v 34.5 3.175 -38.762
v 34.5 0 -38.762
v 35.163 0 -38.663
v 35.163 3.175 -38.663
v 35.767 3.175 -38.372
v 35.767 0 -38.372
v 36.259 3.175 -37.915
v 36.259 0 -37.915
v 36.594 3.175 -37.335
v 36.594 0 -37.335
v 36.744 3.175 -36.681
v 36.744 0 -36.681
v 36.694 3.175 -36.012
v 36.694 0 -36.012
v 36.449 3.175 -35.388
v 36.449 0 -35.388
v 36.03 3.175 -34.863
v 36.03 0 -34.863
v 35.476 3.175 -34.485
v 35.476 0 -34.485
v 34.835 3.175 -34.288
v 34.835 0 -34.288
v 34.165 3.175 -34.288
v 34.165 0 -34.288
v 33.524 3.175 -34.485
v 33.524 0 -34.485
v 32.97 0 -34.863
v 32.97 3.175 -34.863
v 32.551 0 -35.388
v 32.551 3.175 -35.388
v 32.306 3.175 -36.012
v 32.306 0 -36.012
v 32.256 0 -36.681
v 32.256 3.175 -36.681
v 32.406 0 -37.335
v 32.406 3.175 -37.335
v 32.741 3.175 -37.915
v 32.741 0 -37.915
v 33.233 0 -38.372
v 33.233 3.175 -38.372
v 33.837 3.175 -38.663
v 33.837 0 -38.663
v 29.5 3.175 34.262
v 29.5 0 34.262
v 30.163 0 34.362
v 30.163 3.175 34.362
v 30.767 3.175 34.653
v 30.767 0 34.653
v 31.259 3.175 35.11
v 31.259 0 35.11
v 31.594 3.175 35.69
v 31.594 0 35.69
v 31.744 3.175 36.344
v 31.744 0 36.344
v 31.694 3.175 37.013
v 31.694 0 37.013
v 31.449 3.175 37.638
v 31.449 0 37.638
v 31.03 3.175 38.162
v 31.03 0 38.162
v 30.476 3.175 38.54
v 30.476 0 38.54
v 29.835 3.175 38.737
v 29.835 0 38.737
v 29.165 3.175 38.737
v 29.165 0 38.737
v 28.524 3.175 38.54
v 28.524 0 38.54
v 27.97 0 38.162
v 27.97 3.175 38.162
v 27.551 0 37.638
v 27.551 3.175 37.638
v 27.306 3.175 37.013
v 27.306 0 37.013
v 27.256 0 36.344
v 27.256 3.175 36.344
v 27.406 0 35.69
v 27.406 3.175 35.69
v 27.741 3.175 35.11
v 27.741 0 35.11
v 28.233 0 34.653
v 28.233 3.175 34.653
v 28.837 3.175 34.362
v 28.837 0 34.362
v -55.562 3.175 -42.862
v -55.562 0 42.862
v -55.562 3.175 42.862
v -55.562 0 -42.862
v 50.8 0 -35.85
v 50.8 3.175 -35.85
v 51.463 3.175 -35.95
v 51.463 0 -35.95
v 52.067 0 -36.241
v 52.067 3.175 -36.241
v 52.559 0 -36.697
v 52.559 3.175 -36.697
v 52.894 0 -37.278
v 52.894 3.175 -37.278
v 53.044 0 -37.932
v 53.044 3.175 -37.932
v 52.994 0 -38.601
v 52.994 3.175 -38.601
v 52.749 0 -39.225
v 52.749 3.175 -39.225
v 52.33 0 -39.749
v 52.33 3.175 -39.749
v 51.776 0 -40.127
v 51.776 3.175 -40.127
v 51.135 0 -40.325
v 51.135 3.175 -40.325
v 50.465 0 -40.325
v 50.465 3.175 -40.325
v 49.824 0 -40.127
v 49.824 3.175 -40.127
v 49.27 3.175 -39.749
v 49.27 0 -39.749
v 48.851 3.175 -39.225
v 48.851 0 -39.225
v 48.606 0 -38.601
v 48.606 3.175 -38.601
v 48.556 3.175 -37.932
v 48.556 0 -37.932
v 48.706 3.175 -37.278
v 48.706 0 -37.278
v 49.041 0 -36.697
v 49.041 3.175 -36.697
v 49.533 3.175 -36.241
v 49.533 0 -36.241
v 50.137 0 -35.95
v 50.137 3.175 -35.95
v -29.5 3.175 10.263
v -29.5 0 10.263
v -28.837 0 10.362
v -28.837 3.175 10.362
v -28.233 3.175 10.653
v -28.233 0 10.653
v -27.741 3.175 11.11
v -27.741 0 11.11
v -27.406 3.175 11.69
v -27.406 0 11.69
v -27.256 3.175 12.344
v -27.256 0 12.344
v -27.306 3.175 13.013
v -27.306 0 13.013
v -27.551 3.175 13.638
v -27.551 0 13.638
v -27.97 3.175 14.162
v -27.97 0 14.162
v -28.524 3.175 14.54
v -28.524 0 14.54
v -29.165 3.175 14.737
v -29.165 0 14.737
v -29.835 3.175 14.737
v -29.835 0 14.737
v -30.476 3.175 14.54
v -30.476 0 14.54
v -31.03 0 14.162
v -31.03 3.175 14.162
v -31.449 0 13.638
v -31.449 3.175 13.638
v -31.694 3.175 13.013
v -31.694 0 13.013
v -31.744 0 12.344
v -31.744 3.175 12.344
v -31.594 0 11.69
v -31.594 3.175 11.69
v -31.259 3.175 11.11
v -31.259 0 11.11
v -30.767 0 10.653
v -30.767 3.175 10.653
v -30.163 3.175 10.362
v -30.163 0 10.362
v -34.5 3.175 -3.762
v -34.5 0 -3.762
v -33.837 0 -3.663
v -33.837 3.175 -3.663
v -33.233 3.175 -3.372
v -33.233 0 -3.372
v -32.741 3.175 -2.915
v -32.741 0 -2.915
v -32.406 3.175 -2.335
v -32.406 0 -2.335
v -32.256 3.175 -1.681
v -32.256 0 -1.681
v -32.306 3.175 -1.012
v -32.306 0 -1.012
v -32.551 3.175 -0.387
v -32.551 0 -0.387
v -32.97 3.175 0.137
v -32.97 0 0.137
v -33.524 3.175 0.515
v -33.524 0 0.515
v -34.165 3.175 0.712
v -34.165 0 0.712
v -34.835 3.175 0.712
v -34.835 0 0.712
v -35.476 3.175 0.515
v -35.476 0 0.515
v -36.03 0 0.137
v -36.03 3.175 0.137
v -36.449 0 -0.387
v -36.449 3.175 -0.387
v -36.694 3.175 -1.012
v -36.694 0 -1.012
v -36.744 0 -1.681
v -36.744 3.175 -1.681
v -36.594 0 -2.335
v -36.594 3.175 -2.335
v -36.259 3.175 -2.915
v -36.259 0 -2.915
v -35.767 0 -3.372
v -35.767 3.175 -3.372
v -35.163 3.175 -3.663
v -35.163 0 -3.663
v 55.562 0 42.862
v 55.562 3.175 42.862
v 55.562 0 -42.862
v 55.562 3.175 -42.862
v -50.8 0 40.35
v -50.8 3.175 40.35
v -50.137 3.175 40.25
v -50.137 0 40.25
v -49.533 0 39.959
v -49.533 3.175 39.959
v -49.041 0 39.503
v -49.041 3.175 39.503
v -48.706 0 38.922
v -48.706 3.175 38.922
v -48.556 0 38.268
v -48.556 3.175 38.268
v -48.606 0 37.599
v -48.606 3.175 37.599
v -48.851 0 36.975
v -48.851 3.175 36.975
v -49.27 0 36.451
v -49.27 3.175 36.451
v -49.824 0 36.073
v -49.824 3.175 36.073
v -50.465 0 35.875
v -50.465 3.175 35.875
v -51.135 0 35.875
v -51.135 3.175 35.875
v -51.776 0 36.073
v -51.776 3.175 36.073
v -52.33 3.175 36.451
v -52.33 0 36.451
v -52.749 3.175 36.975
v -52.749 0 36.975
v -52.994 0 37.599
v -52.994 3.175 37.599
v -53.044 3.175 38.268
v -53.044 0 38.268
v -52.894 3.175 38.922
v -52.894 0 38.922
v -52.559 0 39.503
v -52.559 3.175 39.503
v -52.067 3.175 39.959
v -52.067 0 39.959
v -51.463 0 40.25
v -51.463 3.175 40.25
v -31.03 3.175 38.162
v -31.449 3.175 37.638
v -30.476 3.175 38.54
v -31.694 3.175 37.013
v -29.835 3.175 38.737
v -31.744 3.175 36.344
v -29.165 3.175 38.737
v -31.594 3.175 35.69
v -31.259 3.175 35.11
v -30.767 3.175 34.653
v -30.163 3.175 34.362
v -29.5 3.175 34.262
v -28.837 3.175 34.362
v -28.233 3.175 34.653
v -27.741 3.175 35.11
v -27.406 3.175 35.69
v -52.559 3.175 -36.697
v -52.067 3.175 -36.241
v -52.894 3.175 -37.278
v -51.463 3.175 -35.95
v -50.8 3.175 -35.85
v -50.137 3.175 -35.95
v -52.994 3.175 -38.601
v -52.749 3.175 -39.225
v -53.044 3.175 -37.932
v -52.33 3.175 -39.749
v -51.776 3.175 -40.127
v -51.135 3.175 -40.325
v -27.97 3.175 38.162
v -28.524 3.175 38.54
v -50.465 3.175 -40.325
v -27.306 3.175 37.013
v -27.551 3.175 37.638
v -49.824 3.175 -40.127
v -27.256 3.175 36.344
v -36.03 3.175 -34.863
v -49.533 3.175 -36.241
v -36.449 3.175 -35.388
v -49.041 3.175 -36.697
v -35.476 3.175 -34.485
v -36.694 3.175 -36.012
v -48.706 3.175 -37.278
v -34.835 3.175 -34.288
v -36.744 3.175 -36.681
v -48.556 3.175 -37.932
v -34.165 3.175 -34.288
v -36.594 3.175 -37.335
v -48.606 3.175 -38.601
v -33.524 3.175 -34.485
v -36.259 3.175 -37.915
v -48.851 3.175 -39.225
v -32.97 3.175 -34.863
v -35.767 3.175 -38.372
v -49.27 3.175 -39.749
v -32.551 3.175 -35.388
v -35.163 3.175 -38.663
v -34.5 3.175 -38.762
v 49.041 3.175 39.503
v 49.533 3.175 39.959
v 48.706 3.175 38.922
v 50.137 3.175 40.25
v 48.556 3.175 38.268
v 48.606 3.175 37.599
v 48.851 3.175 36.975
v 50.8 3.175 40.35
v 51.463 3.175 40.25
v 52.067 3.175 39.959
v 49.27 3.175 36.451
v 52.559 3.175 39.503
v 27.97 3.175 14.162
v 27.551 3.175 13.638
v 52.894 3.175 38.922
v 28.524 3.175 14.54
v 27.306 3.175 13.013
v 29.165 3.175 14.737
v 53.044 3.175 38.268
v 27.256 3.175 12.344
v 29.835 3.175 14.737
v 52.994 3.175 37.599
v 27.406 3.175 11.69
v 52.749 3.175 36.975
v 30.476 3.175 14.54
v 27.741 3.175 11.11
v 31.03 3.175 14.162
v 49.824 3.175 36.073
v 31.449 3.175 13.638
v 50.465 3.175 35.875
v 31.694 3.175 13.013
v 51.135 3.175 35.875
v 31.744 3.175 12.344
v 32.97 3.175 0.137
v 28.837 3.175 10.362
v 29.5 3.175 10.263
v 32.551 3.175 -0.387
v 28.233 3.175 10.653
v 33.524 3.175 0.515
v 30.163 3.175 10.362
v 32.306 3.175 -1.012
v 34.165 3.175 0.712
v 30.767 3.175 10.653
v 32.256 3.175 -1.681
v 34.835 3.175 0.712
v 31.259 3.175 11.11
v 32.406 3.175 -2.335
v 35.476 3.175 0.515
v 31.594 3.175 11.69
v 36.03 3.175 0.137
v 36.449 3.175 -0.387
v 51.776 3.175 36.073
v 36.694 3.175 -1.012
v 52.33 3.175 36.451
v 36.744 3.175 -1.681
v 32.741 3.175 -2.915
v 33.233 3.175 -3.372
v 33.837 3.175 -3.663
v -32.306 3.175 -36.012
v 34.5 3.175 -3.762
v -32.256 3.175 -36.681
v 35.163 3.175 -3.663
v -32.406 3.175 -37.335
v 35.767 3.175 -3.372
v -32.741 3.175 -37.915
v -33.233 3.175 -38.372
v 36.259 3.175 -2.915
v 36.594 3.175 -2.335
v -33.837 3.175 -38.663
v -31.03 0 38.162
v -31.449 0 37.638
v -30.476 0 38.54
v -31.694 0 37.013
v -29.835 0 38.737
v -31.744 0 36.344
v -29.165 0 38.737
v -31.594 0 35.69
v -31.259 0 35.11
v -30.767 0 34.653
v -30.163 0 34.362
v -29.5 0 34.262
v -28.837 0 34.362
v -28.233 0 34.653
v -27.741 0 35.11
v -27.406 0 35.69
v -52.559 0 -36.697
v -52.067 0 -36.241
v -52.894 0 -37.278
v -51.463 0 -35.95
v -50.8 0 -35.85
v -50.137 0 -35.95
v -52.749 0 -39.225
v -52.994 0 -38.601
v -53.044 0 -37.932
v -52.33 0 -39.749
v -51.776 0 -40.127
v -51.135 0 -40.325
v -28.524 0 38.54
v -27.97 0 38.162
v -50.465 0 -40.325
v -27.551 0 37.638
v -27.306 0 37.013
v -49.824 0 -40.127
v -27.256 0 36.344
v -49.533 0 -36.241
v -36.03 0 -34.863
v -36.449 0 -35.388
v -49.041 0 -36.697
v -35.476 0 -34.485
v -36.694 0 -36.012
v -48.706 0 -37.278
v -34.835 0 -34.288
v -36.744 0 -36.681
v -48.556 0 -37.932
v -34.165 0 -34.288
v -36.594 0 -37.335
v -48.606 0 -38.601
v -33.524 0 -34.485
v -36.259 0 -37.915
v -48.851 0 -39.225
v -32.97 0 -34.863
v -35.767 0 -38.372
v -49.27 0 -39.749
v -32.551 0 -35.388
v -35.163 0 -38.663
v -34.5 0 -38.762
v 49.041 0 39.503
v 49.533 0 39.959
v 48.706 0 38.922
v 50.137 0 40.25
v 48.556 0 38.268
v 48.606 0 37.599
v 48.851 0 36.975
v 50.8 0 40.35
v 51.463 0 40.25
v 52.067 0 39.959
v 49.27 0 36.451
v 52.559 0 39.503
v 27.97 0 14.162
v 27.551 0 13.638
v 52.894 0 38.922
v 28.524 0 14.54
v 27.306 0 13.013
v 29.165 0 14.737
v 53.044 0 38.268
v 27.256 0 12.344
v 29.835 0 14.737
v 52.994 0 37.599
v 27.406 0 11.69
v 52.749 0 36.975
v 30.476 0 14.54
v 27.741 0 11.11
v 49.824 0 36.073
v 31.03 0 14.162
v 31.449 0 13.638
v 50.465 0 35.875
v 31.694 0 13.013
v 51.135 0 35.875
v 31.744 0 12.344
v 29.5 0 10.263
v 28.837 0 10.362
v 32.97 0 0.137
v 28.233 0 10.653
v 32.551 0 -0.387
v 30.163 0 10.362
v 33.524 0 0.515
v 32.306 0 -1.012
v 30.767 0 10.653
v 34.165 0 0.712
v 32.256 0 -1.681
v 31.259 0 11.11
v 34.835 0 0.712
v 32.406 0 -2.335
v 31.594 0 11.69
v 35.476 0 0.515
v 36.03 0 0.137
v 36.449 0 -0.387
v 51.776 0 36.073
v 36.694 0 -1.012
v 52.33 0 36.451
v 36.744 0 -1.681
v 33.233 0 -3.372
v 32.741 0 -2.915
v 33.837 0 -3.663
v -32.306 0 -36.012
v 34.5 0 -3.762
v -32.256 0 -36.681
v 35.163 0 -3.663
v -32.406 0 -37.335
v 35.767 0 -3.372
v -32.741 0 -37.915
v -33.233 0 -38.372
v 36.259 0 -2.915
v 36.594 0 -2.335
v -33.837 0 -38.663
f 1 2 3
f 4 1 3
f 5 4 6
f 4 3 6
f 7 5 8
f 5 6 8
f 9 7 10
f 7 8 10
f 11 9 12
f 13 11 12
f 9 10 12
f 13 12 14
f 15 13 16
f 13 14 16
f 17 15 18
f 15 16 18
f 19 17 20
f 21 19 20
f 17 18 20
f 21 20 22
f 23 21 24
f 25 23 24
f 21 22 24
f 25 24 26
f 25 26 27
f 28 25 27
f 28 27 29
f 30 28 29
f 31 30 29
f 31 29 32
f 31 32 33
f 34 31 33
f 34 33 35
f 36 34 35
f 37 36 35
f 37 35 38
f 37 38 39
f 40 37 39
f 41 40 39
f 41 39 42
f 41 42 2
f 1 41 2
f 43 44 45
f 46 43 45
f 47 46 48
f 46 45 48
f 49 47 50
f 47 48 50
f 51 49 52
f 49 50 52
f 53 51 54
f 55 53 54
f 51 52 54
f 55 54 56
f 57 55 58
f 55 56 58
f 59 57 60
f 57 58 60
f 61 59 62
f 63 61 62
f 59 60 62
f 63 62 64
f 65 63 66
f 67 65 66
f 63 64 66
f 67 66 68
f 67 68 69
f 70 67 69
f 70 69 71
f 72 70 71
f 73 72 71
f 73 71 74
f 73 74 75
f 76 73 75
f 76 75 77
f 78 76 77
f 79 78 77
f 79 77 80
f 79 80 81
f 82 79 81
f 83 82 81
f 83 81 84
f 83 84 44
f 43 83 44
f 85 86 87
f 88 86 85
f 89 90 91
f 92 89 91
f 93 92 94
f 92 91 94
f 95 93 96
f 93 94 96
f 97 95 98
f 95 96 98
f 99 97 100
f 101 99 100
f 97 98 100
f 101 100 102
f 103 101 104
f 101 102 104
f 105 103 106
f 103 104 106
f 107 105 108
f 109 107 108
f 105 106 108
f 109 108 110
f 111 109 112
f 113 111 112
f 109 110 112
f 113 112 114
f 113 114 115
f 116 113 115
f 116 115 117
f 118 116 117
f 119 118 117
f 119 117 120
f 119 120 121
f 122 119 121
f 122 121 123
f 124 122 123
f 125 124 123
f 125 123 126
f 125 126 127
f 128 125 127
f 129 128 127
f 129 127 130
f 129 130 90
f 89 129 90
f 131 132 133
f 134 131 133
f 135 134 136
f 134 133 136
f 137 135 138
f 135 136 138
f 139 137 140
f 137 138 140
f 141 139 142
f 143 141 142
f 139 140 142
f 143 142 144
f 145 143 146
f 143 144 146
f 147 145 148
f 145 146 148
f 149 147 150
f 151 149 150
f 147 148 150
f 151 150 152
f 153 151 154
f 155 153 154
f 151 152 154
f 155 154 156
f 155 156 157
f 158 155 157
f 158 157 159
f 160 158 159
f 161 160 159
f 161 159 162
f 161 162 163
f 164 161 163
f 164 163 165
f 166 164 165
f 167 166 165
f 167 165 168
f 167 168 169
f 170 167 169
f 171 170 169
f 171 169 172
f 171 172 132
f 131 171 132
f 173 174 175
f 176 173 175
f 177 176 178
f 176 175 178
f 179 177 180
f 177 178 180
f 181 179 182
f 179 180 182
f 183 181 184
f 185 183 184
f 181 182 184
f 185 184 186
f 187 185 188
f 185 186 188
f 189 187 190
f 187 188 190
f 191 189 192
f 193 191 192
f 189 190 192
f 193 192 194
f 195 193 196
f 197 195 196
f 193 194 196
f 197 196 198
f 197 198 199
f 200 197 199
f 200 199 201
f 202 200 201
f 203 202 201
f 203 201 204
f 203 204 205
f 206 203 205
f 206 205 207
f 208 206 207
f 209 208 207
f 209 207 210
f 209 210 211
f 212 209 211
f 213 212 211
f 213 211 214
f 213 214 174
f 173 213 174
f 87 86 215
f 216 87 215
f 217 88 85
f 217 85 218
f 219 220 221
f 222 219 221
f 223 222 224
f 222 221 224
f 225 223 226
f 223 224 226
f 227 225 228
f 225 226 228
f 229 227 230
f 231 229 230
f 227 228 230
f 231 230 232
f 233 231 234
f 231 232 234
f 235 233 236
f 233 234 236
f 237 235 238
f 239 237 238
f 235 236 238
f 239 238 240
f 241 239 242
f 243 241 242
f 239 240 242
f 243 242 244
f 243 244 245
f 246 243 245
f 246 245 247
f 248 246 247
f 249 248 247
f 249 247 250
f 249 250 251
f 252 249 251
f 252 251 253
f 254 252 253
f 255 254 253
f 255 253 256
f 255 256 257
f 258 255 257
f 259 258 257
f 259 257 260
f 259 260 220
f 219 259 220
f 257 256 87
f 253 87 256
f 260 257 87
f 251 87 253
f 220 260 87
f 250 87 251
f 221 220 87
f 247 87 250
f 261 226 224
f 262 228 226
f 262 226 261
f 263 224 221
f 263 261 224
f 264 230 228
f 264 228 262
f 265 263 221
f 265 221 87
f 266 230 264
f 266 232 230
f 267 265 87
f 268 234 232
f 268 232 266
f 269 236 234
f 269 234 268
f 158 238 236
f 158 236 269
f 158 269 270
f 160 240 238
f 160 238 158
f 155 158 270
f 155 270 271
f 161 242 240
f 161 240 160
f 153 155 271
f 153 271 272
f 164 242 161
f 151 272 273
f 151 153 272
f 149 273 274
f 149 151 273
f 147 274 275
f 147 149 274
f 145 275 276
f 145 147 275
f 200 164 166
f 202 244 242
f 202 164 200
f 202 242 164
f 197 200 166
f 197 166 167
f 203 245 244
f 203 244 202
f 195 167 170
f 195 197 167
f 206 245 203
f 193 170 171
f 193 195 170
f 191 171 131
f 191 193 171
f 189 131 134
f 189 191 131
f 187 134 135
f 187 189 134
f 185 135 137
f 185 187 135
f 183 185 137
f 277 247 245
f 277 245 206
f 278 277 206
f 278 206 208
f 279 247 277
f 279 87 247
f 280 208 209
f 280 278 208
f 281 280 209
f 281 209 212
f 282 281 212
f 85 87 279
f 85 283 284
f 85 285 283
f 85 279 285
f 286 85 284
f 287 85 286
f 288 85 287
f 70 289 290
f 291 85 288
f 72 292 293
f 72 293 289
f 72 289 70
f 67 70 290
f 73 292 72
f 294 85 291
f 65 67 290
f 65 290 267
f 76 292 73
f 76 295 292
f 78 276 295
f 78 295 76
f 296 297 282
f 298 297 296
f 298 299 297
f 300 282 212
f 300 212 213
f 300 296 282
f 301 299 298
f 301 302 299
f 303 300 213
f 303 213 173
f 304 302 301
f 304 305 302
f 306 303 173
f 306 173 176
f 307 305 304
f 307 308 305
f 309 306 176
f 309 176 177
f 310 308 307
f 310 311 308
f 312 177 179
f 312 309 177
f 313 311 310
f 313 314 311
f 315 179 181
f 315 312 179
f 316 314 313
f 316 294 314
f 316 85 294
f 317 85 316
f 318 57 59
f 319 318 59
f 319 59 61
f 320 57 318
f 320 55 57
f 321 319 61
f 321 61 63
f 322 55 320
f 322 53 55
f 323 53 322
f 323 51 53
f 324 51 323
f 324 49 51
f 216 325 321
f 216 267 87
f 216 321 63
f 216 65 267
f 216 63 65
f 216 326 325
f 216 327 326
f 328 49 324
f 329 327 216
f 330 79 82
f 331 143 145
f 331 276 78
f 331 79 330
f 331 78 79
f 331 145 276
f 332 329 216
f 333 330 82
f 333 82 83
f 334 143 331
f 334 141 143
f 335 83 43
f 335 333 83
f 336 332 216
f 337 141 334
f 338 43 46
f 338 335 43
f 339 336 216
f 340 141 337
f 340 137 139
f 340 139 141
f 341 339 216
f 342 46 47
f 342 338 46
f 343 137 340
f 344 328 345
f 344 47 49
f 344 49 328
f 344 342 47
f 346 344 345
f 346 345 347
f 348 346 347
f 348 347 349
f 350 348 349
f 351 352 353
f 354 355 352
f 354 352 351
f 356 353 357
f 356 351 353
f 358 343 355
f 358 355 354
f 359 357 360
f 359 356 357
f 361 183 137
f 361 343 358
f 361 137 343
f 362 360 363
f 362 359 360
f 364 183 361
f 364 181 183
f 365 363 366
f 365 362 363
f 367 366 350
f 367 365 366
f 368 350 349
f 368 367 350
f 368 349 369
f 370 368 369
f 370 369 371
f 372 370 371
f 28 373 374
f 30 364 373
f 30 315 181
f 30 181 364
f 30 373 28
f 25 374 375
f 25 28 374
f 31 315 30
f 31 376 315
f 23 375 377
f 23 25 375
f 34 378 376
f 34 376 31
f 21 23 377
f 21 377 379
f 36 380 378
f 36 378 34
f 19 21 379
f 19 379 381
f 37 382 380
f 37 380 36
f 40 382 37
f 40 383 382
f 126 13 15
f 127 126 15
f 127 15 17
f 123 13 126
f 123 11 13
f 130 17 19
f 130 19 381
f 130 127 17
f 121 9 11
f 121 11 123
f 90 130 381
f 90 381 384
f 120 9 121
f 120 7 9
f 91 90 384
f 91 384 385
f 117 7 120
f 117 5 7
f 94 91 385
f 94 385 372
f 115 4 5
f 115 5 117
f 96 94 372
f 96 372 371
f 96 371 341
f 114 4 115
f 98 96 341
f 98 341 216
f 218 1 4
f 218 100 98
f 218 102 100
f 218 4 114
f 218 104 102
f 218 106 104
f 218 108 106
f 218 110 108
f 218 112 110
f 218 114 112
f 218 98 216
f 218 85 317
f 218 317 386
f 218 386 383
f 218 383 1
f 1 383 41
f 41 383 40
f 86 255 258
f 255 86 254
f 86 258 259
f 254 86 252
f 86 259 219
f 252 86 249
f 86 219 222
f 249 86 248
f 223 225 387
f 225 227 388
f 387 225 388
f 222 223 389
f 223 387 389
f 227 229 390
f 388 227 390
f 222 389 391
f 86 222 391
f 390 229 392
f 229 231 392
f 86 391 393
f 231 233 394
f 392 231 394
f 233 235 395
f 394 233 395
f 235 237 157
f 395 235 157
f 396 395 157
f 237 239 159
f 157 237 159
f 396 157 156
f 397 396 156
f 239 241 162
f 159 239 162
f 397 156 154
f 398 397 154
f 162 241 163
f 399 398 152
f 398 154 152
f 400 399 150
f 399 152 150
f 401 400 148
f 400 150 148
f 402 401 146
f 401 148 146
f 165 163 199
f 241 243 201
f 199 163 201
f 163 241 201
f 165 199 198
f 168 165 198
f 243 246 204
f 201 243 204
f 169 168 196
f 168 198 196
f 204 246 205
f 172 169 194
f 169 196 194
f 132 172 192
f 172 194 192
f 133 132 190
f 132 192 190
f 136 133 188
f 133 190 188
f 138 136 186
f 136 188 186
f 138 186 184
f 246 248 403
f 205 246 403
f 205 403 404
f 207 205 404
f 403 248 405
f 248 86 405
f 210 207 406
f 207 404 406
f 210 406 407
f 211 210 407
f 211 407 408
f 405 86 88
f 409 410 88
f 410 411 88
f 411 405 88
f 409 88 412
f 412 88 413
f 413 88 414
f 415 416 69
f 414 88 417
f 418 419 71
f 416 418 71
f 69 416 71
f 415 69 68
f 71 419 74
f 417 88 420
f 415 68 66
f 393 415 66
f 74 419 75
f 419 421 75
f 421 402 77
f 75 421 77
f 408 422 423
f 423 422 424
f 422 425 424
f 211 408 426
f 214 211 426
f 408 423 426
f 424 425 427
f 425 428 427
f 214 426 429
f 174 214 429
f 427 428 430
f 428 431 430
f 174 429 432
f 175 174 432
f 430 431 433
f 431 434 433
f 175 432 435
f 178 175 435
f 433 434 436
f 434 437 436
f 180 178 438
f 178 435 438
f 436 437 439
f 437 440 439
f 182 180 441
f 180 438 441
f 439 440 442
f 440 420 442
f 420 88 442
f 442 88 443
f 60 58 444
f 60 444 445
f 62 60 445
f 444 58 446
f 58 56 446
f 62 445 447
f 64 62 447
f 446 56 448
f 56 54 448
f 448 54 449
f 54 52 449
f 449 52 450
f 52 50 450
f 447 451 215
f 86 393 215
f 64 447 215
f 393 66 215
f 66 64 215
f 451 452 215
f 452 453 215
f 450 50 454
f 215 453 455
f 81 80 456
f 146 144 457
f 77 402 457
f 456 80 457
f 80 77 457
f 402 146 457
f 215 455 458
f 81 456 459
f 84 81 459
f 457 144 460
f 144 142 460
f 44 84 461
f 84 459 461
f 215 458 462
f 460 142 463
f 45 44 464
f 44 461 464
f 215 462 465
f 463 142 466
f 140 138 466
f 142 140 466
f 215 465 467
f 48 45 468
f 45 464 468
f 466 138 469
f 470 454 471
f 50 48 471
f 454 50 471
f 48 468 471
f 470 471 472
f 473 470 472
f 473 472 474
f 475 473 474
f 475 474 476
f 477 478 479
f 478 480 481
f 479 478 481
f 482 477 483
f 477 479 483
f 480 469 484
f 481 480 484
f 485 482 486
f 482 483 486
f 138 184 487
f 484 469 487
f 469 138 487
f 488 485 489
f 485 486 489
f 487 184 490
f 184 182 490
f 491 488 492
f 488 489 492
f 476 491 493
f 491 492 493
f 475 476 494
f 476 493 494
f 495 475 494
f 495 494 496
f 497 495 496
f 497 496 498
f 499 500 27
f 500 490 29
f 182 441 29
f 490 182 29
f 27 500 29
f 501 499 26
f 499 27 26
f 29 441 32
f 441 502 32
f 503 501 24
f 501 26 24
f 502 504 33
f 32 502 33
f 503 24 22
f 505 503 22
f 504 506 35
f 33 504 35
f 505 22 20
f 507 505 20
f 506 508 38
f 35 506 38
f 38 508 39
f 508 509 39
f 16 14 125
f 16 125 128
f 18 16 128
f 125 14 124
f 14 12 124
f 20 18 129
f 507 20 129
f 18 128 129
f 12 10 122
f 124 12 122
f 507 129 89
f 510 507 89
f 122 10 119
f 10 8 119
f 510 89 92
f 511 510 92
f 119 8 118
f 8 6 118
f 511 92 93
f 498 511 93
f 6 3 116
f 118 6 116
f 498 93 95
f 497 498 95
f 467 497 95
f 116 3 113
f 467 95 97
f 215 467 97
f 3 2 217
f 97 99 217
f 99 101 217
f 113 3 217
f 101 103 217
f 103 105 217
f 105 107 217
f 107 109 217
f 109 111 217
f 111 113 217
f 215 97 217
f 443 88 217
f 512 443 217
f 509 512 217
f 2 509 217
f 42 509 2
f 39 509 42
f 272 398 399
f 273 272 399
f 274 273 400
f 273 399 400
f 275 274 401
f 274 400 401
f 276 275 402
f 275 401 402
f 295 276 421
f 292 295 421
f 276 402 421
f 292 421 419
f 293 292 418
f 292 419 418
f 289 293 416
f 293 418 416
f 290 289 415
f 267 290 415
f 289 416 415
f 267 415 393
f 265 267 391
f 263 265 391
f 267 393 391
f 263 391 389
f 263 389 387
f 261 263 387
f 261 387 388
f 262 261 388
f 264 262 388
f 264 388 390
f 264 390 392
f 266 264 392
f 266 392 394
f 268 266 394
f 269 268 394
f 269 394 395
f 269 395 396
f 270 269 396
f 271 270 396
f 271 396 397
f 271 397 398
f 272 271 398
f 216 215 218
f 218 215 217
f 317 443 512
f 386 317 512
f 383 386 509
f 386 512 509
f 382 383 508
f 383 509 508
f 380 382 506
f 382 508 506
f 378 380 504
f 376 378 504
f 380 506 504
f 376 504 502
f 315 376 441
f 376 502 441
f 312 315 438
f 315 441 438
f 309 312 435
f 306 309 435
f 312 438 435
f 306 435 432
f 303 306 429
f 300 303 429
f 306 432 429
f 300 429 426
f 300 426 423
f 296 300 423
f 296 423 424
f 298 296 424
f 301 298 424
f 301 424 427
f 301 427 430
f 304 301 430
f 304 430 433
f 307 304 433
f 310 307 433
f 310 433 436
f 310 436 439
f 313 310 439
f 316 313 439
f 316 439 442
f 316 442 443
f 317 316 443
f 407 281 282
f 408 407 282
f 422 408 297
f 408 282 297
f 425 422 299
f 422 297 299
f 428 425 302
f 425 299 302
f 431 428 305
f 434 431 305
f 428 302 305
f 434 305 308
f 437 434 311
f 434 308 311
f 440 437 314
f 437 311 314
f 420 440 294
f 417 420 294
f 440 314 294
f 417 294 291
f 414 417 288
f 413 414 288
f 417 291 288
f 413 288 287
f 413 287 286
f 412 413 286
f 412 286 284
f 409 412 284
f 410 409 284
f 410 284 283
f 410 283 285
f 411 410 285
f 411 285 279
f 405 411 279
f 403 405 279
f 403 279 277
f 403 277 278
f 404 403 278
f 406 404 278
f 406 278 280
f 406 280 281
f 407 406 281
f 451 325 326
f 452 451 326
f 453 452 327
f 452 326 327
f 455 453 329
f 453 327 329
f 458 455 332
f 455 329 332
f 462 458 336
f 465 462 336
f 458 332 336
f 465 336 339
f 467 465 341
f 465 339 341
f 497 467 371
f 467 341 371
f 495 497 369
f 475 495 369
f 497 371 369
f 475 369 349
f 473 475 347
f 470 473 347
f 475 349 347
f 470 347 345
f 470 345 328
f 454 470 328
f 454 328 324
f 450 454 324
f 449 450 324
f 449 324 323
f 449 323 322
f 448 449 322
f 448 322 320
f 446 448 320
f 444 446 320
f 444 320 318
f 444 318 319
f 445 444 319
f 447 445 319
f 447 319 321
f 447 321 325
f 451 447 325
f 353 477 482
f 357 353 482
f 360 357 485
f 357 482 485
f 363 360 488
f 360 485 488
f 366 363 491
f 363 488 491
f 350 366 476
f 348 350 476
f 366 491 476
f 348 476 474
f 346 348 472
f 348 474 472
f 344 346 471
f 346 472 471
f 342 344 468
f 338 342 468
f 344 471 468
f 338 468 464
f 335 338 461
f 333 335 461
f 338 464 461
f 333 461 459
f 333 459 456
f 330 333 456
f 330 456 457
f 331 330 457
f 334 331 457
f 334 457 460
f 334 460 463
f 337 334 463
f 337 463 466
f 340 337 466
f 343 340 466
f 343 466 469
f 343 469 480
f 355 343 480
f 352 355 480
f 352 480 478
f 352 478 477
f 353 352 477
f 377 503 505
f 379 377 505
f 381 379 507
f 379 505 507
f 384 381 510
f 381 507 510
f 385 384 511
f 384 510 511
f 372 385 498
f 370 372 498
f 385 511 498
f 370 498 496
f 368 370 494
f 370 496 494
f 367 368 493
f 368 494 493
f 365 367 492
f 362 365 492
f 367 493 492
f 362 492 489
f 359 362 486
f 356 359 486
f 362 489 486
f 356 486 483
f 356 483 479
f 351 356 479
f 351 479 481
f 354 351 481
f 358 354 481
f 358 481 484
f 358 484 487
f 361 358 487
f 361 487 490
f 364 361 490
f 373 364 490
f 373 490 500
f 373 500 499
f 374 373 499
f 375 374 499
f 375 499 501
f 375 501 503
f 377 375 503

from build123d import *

# Parameters (mm, degrees)
SKETCH1_W            = 111.125
SKETCH1_H            = 85.725
BOSS_EXTRUDE1_DEPTH  = 3.175
M3_CLEARANCE_HOLE1_D = 4.5
M3_CLEARANCE_HOLE2_D = 4.5


with BuildPart() as part:
    # Sketch1 → Boss-Extrude1 (new body)
    with BuildSketch(Plane(origin=(0, 0, 0), x_dir=(1, 0, 0), z_dir=(0, 1, 0))):
        Rectangle(SKETCH1_W, SKETCH1_H)
    extrude(amount=BOSS_EXTRUDE1_DEPTH)

    # M3 Clearance Hole1 (through all)
    with Locations(Plane(origin=(-50.8, 0, 38.1), x_dir=(0, 0, -1), z_dir=(0, -1, 0))):
        with Locations((0, 0), (0, 101.6), (76.2, 0), (76.2, 101.6)):
            Hole(M3_CLEARANCE_HOLE1_D / 2)

    # M3 Clearance Hole2 (through all)
    with Locations(Plane(origin=(-29.5, 3.175, 36.5125), x_dir=(0, 0, 1), z_dir=(0, 1, 0))):
        with Locations((0, 0), (-24, 0), (-24, 59), (0, 59), (-38.025, 64), (-73.025, 64), (-73.025, -5), (-38.025, -5)):
            Hole(M3_CLEARANCE_HOLE2_D / 2)


solid = part.part
